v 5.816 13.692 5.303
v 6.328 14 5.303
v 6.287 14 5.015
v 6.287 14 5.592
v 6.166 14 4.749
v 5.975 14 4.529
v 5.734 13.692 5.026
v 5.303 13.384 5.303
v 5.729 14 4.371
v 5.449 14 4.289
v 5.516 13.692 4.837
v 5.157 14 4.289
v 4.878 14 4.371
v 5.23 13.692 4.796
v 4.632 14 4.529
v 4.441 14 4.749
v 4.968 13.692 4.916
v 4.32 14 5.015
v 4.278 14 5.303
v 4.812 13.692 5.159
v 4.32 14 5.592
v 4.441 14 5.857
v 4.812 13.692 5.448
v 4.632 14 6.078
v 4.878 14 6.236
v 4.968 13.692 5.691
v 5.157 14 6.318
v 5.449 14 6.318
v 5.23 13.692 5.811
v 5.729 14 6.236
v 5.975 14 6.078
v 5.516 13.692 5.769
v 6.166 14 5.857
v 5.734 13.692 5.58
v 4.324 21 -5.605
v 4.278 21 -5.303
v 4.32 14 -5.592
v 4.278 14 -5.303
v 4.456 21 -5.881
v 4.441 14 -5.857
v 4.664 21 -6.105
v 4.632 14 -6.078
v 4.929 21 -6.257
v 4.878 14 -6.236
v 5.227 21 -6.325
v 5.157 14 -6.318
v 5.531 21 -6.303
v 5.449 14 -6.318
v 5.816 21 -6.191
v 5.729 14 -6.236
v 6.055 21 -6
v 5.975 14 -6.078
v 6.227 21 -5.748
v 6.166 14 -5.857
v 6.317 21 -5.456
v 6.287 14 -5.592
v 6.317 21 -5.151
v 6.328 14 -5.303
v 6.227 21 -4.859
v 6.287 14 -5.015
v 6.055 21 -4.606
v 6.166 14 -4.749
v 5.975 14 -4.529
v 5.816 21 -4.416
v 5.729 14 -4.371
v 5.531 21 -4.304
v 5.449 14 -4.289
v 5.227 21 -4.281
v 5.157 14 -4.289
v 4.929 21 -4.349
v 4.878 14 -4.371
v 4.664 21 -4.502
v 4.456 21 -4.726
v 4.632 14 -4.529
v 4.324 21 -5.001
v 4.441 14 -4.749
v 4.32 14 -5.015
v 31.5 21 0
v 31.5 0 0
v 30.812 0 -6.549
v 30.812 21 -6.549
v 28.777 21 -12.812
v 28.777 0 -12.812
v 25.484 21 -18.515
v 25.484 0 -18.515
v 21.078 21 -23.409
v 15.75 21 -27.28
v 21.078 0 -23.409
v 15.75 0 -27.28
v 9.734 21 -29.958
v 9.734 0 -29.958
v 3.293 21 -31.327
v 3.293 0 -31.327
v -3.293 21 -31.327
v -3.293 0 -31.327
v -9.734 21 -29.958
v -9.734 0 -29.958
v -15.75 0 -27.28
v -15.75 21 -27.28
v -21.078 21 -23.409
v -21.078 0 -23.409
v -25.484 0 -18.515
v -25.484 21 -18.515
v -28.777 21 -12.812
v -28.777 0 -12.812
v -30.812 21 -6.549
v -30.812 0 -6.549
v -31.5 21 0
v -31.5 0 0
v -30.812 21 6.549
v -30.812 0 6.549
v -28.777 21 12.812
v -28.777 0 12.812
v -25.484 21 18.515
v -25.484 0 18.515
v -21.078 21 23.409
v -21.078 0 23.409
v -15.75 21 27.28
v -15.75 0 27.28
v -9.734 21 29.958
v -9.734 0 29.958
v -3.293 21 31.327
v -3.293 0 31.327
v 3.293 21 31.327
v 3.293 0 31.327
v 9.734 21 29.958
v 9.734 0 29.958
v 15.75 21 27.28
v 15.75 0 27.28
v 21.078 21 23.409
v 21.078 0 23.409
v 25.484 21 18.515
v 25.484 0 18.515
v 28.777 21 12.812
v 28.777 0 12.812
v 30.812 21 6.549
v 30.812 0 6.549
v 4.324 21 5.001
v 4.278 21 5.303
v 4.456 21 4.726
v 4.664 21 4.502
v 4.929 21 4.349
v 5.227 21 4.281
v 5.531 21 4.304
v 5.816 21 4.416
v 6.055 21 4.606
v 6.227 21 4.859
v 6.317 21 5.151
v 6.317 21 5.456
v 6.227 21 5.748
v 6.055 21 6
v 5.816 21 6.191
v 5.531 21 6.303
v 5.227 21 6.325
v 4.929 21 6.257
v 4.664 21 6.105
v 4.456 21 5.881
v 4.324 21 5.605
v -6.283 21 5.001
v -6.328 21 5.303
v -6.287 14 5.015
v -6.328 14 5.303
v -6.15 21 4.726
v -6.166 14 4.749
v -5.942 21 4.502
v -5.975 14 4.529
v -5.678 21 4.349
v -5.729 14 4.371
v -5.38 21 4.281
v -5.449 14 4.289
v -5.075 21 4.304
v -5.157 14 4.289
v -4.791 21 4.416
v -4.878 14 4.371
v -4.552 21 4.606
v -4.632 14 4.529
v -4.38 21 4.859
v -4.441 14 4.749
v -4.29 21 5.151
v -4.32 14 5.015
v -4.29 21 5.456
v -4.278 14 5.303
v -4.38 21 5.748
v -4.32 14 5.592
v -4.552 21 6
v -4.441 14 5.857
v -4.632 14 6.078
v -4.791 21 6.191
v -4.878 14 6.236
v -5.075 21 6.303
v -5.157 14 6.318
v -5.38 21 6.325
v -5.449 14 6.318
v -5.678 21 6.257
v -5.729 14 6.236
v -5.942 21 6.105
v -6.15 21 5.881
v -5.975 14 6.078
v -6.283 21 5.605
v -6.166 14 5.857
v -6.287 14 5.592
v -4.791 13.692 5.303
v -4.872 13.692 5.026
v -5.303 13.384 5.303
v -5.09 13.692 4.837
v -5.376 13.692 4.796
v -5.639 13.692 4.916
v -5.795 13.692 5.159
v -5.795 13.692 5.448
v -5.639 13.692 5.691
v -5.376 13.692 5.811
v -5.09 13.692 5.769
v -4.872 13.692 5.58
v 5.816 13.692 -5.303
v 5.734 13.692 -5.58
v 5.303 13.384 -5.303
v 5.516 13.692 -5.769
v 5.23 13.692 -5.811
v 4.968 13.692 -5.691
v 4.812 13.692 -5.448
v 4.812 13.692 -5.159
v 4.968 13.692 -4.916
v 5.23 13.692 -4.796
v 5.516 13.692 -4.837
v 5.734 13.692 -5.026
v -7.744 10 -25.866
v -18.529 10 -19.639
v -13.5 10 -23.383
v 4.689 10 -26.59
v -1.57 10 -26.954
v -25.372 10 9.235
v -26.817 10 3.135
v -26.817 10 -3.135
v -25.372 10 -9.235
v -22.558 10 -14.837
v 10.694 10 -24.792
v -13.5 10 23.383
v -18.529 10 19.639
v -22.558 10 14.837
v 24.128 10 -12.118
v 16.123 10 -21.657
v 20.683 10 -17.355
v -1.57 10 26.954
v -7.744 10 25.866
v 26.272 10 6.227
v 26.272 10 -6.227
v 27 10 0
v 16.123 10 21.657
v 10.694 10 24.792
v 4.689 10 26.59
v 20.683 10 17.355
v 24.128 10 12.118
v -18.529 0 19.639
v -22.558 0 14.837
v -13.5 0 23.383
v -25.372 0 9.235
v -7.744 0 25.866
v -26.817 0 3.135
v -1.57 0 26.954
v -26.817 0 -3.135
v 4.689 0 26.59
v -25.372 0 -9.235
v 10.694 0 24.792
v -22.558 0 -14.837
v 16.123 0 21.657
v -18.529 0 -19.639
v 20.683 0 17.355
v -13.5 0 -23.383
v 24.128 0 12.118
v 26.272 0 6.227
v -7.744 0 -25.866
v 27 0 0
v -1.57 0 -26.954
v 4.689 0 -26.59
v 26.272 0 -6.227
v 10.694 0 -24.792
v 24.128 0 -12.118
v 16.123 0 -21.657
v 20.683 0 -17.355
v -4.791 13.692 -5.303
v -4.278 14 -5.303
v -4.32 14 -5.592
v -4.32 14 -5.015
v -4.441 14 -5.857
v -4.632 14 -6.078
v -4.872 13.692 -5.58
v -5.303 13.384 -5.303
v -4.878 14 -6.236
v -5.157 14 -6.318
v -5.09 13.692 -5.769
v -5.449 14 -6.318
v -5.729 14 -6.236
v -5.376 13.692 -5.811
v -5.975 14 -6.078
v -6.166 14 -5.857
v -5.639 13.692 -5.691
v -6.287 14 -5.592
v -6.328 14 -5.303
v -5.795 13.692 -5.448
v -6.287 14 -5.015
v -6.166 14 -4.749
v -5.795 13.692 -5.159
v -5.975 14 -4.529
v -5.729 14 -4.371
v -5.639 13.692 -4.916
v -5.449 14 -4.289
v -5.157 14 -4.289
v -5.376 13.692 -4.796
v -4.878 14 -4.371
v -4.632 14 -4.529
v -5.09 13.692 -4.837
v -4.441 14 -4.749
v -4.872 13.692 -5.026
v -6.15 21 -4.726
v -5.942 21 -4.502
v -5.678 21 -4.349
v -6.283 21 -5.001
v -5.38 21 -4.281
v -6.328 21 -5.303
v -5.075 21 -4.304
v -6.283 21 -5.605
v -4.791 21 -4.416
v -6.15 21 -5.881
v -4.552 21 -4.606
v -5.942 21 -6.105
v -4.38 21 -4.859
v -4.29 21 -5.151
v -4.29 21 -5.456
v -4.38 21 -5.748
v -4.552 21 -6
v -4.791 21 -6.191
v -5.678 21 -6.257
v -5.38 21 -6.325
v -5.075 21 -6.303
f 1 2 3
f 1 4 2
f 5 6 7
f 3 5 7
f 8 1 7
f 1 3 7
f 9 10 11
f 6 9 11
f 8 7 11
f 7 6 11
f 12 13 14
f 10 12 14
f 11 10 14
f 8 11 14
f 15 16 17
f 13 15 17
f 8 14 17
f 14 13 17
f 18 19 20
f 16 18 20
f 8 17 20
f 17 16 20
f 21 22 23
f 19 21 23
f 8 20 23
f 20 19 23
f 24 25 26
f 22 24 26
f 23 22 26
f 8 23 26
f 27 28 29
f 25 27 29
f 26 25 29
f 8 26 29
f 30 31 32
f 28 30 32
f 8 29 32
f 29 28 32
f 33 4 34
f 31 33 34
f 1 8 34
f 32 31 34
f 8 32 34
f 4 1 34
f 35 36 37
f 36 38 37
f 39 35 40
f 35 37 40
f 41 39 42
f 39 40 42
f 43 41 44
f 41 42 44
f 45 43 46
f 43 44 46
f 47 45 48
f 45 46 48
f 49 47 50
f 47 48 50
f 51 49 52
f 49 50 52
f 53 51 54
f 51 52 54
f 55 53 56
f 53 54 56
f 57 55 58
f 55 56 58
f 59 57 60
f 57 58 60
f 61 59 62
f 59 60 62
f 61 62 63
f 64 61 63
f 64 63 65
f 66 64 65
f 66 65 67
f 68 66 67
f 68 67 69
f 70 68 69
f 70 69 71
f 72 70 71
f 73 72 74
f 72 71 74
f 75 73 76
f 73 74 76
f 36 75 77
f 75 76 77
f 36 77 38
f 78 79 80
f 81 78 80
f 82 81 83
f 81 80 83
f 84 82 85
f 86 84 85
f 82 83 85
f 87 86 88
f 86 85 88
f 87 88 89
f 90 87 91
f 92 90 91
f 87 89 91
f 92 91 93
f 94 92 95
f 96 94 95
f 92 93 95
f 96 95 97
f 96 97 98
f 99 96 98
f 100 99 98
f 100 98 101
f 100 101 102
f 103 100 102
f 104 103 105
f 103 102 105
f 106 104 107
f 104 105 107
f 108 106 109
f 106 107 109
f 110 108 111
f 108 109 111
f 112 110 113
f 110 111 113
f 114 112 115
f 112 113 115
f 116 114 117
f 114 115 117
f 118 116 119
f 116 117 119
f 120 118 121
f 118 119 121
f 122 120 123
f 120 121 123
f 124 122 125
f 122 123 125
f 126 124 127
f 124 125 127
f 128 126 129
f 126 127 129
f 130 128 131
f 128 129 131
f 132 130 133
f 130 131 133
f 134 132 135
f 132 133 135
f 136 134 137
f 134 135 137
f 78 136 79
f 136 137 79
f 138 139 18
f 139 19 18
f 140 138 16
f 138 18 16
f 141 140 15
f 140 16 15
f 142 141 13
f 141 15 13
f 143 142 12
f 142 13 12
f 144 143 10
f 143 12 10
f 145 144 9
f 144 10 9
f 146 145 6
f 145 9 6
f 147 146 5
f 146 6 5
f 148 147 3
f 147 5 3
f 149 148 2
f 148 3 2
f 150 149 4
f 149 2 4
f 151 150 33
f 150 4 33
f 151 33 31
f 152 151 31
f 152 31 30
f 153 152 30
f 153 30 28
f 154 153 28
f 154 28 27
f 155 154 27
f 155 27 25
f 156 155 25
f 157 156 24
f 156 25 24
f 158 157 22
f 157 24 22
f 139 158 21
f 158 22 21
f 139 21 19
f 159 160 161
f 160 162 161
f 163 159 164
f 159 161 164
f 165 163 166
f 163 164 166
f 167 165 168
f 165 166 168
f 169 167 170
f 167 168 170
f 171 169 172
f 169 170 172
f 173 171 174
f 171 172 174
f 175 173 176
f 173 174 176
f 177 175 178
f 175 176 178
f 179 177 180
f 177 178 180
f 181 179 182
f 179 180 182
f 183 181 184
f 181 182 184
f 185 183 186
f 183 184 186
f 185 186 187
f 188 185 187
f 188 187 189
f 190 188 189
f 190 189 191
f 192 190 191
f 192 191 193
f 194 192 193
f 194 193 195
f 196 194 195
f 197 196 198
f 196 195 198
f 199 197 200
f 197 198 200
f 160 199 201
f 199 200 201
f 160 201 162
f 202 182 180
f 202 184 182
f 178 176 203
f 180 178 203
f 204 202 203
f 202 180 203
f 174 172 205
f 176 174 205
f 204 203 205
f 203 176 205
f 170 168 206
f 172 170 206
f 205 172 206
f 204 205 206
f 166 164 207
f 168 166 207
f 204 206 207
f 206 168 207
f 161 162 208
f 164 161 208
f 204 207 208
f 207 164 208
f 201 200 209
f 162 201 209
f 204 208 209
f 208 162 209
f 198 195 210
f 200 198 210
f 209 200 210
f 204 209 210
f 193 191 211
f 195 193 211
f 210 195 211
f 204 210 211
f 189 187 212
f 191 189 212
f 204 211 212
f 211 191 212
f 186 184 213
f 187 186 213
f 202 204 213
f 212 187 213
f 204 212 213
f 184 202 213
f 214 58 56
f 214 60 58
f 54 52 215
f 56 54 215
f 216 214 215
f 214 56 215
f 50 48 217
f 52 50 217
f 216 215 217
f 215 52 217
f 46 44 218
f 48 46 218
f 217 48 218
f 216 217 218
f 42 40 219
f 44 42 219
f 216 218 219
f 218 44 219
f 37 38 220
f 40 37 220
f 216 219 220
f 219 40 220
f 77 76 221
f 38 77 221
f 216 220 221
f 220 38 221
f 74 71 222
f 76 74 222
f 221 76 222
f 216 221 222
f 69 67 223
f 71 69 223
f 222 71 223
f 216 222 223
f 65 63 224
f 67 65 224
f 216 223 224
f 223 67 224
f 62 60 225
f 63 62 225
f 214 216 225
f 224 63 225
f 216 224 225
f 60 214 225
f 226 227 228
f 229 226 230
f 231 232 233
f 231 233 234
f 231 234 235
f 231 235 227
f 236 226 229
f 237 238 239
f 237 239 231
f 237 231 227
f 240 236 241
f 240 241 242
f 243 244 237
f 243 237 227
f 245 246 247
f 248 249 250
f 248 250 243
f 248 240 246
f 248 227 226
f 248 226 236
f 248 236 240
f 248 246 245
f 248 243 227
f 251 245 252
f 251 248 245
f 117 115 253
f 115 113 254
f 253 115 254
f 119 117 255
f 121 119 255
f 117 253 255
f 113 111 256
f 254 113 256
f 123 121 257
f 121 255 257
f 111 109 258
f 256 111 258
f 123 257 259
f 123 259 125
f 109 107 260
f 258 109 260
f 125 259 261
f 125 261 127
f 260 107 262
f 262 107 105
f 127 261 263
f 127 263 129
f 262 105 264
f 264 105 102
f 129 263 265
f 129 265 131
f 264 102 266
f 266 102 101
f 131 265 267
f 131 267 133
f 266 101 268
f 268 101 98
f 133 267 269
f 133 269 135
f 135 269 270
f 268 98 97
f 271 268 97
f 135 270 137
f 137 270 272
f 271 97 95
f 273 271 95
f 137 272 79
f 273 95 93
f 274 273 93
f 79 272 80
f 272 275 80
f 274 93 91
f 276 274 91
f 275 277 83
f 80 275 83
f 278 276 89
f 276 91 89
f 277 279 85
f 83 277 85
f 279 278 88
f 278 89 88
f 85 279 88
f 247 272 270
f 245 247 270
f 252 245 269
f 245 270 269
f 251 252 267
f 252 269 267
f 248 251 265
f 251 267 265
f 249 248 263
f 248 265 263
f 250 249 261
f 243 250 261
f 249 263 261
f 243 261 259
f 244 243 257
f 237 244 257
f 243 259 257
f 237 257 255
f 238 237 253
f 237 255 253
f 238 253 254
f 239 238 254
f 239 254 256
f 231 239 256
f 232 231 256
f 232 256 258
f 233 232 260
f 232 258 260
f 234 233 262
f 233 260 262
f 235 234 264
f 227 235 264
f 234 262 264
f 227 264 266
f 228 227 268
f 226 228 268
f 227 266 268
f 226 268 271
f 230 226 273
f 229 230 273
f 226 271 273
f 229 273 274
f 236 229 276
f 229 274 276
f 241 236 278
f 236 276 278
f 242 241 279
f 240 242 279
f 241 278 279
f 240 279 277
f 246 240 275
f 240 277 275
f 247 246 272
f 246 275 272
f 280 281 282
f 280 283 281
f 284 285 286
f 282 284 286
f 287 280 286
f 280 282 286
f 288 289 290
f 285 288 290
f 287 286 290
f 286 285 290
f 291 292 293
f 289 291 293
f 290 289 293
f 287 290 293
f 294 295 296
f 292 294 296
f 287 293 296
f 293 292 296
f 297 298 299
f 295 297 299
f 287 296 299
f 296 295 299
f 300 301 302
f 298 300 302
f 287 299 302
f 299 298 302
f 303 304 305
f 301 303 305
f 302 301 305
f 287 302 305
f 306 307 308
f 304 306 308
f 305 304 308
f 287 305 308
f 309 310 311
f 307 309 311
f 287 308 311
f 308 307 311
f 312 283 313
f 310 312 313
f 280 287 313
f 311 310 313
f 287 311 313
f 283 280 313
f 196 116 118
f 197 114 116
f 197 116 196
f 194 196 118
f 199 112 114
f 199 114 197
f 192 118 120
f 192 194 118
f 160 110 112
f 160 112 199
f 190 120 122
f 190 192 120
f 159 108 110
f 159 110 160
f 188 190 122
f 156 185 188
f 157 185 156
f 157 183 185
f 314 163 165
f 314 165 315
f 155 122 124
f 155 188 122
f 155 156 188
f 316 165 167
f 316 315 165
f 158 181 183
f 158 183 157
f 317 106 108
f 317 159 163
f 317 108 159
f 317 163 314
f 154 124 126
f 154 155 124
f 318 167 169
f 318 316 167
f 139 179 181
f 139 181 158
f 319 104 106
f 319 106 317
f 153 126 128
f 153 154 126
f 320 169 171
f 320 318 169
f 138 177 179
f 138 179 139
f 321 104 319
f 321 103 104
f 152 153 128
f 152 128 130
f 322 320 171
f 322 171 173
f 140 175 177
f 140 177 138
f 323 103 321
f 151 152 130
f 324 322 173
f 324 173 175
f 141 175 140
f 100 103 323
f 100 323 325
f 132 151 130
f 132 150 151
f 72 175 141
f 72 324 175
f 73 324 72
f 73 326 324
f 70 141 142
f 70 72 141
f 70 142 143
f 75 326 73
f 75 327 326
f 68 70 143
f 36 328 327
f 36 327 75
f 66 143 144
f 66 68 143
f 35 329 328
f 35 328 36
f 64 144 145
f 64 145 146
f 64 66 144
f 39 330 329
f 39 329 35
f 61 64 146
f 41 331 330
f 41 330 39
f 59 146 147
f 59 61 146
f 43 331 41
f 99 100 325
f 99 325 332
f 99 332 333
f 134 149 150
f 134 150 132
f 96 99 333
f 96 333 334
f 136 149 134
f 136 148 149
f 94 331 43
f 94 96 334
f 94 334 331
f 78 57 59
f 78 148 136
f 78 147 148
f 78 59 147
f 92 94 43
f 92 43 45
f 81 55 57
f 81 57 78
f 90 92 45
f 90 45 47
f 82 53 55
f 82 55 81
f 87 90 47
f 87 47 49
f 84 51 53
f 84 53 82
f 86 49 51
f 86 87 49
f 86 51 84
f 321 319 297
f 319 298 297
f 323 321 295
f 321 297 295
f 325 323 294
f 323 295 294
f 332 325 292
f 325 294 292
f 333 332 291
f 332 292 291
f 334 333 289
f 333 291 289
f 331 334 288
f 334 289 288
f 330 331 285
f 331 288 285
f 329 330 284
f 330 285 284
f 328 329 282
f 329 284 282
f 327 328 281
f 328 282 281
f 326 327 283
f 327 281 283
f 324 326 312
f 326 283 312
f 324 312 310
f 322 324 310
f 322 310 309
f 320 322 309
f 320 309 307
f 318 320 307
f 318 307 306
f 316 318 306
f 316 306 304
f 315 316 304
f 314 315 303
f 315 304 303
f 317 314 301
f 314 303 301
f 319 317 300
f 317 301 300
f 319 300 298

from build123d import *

# Parameters (mm, degrees)
SKETCH1_R                          = 31.5
BOSS_EXTRUDE1_DEPTH                = 21
TAP_DRILL_FOR_M2_5X0_45_TAP2_D     = 2.05
TAP_DRILL_FOR_M2_5X0_45_TAP2_DEPTH = 7
TAP_DRILL_FOR_M2_5X0_45_TAP2_TIP   = 0.615882135
SKETCH6_R                          = 27
CUT_EXTRUDE1_DEPTH                 = 10


with BuildPart() as part:
    # Sketch1 → Boss-Extrude1 (new body)
    with BuildSketch(Plane(origin=(0, 0, 0), x_dir=(1, 0, 0), z_dir=(0, 1, 0))):
        Circle(SKETCH1_R)
    extrude(amount=BOSS_EXTRUDE1_DEPTH)

    # Tap Drill for M2.5x0.45 Tap2
    with Locations(Plane(origin=(0, 21, 0), x_dir=(1, 0, 0), z_dir=(0, 1, 0))):
        with Locations((-5.303300859, 5.303300859), (5.303300859, 5.303300859), (5.303300859, -5.303300859), (-5.303300859, -5.303300859)):
            Hole(TAP_DRILL_FOR_M2_5X0_45_TAP2_D / 2, depth=TAP_DRILL_FOR_M2_5X0_45_TAP2_DEPTH)
            with Locations((0, 0, -(TAP_DRILL_FOR_M2_5X0_45_TAP2_DEPTH + TAP_DRILL_FOR_M2_5X0_45_TAP2_TIP / 2))):  # 118° drill point
                Cone(0, TAP_DRILL_FOR_M2_5X0_45_TAP2_D / 2, TAP_DRILL_FOR_M2_5X0_45_TAP2_TIP, mode=Mode.SUBTRACT)

    # Sketch6 → Cut-Extrude1 (cut)
    with BuildSketch(Plane.XZ):
        Circle(SKETCH6_R)
    extrude(amount=-CUT_EXTRUDE1_DEPTH, mode=Mode.SUBTRACT)


solid = part.part
